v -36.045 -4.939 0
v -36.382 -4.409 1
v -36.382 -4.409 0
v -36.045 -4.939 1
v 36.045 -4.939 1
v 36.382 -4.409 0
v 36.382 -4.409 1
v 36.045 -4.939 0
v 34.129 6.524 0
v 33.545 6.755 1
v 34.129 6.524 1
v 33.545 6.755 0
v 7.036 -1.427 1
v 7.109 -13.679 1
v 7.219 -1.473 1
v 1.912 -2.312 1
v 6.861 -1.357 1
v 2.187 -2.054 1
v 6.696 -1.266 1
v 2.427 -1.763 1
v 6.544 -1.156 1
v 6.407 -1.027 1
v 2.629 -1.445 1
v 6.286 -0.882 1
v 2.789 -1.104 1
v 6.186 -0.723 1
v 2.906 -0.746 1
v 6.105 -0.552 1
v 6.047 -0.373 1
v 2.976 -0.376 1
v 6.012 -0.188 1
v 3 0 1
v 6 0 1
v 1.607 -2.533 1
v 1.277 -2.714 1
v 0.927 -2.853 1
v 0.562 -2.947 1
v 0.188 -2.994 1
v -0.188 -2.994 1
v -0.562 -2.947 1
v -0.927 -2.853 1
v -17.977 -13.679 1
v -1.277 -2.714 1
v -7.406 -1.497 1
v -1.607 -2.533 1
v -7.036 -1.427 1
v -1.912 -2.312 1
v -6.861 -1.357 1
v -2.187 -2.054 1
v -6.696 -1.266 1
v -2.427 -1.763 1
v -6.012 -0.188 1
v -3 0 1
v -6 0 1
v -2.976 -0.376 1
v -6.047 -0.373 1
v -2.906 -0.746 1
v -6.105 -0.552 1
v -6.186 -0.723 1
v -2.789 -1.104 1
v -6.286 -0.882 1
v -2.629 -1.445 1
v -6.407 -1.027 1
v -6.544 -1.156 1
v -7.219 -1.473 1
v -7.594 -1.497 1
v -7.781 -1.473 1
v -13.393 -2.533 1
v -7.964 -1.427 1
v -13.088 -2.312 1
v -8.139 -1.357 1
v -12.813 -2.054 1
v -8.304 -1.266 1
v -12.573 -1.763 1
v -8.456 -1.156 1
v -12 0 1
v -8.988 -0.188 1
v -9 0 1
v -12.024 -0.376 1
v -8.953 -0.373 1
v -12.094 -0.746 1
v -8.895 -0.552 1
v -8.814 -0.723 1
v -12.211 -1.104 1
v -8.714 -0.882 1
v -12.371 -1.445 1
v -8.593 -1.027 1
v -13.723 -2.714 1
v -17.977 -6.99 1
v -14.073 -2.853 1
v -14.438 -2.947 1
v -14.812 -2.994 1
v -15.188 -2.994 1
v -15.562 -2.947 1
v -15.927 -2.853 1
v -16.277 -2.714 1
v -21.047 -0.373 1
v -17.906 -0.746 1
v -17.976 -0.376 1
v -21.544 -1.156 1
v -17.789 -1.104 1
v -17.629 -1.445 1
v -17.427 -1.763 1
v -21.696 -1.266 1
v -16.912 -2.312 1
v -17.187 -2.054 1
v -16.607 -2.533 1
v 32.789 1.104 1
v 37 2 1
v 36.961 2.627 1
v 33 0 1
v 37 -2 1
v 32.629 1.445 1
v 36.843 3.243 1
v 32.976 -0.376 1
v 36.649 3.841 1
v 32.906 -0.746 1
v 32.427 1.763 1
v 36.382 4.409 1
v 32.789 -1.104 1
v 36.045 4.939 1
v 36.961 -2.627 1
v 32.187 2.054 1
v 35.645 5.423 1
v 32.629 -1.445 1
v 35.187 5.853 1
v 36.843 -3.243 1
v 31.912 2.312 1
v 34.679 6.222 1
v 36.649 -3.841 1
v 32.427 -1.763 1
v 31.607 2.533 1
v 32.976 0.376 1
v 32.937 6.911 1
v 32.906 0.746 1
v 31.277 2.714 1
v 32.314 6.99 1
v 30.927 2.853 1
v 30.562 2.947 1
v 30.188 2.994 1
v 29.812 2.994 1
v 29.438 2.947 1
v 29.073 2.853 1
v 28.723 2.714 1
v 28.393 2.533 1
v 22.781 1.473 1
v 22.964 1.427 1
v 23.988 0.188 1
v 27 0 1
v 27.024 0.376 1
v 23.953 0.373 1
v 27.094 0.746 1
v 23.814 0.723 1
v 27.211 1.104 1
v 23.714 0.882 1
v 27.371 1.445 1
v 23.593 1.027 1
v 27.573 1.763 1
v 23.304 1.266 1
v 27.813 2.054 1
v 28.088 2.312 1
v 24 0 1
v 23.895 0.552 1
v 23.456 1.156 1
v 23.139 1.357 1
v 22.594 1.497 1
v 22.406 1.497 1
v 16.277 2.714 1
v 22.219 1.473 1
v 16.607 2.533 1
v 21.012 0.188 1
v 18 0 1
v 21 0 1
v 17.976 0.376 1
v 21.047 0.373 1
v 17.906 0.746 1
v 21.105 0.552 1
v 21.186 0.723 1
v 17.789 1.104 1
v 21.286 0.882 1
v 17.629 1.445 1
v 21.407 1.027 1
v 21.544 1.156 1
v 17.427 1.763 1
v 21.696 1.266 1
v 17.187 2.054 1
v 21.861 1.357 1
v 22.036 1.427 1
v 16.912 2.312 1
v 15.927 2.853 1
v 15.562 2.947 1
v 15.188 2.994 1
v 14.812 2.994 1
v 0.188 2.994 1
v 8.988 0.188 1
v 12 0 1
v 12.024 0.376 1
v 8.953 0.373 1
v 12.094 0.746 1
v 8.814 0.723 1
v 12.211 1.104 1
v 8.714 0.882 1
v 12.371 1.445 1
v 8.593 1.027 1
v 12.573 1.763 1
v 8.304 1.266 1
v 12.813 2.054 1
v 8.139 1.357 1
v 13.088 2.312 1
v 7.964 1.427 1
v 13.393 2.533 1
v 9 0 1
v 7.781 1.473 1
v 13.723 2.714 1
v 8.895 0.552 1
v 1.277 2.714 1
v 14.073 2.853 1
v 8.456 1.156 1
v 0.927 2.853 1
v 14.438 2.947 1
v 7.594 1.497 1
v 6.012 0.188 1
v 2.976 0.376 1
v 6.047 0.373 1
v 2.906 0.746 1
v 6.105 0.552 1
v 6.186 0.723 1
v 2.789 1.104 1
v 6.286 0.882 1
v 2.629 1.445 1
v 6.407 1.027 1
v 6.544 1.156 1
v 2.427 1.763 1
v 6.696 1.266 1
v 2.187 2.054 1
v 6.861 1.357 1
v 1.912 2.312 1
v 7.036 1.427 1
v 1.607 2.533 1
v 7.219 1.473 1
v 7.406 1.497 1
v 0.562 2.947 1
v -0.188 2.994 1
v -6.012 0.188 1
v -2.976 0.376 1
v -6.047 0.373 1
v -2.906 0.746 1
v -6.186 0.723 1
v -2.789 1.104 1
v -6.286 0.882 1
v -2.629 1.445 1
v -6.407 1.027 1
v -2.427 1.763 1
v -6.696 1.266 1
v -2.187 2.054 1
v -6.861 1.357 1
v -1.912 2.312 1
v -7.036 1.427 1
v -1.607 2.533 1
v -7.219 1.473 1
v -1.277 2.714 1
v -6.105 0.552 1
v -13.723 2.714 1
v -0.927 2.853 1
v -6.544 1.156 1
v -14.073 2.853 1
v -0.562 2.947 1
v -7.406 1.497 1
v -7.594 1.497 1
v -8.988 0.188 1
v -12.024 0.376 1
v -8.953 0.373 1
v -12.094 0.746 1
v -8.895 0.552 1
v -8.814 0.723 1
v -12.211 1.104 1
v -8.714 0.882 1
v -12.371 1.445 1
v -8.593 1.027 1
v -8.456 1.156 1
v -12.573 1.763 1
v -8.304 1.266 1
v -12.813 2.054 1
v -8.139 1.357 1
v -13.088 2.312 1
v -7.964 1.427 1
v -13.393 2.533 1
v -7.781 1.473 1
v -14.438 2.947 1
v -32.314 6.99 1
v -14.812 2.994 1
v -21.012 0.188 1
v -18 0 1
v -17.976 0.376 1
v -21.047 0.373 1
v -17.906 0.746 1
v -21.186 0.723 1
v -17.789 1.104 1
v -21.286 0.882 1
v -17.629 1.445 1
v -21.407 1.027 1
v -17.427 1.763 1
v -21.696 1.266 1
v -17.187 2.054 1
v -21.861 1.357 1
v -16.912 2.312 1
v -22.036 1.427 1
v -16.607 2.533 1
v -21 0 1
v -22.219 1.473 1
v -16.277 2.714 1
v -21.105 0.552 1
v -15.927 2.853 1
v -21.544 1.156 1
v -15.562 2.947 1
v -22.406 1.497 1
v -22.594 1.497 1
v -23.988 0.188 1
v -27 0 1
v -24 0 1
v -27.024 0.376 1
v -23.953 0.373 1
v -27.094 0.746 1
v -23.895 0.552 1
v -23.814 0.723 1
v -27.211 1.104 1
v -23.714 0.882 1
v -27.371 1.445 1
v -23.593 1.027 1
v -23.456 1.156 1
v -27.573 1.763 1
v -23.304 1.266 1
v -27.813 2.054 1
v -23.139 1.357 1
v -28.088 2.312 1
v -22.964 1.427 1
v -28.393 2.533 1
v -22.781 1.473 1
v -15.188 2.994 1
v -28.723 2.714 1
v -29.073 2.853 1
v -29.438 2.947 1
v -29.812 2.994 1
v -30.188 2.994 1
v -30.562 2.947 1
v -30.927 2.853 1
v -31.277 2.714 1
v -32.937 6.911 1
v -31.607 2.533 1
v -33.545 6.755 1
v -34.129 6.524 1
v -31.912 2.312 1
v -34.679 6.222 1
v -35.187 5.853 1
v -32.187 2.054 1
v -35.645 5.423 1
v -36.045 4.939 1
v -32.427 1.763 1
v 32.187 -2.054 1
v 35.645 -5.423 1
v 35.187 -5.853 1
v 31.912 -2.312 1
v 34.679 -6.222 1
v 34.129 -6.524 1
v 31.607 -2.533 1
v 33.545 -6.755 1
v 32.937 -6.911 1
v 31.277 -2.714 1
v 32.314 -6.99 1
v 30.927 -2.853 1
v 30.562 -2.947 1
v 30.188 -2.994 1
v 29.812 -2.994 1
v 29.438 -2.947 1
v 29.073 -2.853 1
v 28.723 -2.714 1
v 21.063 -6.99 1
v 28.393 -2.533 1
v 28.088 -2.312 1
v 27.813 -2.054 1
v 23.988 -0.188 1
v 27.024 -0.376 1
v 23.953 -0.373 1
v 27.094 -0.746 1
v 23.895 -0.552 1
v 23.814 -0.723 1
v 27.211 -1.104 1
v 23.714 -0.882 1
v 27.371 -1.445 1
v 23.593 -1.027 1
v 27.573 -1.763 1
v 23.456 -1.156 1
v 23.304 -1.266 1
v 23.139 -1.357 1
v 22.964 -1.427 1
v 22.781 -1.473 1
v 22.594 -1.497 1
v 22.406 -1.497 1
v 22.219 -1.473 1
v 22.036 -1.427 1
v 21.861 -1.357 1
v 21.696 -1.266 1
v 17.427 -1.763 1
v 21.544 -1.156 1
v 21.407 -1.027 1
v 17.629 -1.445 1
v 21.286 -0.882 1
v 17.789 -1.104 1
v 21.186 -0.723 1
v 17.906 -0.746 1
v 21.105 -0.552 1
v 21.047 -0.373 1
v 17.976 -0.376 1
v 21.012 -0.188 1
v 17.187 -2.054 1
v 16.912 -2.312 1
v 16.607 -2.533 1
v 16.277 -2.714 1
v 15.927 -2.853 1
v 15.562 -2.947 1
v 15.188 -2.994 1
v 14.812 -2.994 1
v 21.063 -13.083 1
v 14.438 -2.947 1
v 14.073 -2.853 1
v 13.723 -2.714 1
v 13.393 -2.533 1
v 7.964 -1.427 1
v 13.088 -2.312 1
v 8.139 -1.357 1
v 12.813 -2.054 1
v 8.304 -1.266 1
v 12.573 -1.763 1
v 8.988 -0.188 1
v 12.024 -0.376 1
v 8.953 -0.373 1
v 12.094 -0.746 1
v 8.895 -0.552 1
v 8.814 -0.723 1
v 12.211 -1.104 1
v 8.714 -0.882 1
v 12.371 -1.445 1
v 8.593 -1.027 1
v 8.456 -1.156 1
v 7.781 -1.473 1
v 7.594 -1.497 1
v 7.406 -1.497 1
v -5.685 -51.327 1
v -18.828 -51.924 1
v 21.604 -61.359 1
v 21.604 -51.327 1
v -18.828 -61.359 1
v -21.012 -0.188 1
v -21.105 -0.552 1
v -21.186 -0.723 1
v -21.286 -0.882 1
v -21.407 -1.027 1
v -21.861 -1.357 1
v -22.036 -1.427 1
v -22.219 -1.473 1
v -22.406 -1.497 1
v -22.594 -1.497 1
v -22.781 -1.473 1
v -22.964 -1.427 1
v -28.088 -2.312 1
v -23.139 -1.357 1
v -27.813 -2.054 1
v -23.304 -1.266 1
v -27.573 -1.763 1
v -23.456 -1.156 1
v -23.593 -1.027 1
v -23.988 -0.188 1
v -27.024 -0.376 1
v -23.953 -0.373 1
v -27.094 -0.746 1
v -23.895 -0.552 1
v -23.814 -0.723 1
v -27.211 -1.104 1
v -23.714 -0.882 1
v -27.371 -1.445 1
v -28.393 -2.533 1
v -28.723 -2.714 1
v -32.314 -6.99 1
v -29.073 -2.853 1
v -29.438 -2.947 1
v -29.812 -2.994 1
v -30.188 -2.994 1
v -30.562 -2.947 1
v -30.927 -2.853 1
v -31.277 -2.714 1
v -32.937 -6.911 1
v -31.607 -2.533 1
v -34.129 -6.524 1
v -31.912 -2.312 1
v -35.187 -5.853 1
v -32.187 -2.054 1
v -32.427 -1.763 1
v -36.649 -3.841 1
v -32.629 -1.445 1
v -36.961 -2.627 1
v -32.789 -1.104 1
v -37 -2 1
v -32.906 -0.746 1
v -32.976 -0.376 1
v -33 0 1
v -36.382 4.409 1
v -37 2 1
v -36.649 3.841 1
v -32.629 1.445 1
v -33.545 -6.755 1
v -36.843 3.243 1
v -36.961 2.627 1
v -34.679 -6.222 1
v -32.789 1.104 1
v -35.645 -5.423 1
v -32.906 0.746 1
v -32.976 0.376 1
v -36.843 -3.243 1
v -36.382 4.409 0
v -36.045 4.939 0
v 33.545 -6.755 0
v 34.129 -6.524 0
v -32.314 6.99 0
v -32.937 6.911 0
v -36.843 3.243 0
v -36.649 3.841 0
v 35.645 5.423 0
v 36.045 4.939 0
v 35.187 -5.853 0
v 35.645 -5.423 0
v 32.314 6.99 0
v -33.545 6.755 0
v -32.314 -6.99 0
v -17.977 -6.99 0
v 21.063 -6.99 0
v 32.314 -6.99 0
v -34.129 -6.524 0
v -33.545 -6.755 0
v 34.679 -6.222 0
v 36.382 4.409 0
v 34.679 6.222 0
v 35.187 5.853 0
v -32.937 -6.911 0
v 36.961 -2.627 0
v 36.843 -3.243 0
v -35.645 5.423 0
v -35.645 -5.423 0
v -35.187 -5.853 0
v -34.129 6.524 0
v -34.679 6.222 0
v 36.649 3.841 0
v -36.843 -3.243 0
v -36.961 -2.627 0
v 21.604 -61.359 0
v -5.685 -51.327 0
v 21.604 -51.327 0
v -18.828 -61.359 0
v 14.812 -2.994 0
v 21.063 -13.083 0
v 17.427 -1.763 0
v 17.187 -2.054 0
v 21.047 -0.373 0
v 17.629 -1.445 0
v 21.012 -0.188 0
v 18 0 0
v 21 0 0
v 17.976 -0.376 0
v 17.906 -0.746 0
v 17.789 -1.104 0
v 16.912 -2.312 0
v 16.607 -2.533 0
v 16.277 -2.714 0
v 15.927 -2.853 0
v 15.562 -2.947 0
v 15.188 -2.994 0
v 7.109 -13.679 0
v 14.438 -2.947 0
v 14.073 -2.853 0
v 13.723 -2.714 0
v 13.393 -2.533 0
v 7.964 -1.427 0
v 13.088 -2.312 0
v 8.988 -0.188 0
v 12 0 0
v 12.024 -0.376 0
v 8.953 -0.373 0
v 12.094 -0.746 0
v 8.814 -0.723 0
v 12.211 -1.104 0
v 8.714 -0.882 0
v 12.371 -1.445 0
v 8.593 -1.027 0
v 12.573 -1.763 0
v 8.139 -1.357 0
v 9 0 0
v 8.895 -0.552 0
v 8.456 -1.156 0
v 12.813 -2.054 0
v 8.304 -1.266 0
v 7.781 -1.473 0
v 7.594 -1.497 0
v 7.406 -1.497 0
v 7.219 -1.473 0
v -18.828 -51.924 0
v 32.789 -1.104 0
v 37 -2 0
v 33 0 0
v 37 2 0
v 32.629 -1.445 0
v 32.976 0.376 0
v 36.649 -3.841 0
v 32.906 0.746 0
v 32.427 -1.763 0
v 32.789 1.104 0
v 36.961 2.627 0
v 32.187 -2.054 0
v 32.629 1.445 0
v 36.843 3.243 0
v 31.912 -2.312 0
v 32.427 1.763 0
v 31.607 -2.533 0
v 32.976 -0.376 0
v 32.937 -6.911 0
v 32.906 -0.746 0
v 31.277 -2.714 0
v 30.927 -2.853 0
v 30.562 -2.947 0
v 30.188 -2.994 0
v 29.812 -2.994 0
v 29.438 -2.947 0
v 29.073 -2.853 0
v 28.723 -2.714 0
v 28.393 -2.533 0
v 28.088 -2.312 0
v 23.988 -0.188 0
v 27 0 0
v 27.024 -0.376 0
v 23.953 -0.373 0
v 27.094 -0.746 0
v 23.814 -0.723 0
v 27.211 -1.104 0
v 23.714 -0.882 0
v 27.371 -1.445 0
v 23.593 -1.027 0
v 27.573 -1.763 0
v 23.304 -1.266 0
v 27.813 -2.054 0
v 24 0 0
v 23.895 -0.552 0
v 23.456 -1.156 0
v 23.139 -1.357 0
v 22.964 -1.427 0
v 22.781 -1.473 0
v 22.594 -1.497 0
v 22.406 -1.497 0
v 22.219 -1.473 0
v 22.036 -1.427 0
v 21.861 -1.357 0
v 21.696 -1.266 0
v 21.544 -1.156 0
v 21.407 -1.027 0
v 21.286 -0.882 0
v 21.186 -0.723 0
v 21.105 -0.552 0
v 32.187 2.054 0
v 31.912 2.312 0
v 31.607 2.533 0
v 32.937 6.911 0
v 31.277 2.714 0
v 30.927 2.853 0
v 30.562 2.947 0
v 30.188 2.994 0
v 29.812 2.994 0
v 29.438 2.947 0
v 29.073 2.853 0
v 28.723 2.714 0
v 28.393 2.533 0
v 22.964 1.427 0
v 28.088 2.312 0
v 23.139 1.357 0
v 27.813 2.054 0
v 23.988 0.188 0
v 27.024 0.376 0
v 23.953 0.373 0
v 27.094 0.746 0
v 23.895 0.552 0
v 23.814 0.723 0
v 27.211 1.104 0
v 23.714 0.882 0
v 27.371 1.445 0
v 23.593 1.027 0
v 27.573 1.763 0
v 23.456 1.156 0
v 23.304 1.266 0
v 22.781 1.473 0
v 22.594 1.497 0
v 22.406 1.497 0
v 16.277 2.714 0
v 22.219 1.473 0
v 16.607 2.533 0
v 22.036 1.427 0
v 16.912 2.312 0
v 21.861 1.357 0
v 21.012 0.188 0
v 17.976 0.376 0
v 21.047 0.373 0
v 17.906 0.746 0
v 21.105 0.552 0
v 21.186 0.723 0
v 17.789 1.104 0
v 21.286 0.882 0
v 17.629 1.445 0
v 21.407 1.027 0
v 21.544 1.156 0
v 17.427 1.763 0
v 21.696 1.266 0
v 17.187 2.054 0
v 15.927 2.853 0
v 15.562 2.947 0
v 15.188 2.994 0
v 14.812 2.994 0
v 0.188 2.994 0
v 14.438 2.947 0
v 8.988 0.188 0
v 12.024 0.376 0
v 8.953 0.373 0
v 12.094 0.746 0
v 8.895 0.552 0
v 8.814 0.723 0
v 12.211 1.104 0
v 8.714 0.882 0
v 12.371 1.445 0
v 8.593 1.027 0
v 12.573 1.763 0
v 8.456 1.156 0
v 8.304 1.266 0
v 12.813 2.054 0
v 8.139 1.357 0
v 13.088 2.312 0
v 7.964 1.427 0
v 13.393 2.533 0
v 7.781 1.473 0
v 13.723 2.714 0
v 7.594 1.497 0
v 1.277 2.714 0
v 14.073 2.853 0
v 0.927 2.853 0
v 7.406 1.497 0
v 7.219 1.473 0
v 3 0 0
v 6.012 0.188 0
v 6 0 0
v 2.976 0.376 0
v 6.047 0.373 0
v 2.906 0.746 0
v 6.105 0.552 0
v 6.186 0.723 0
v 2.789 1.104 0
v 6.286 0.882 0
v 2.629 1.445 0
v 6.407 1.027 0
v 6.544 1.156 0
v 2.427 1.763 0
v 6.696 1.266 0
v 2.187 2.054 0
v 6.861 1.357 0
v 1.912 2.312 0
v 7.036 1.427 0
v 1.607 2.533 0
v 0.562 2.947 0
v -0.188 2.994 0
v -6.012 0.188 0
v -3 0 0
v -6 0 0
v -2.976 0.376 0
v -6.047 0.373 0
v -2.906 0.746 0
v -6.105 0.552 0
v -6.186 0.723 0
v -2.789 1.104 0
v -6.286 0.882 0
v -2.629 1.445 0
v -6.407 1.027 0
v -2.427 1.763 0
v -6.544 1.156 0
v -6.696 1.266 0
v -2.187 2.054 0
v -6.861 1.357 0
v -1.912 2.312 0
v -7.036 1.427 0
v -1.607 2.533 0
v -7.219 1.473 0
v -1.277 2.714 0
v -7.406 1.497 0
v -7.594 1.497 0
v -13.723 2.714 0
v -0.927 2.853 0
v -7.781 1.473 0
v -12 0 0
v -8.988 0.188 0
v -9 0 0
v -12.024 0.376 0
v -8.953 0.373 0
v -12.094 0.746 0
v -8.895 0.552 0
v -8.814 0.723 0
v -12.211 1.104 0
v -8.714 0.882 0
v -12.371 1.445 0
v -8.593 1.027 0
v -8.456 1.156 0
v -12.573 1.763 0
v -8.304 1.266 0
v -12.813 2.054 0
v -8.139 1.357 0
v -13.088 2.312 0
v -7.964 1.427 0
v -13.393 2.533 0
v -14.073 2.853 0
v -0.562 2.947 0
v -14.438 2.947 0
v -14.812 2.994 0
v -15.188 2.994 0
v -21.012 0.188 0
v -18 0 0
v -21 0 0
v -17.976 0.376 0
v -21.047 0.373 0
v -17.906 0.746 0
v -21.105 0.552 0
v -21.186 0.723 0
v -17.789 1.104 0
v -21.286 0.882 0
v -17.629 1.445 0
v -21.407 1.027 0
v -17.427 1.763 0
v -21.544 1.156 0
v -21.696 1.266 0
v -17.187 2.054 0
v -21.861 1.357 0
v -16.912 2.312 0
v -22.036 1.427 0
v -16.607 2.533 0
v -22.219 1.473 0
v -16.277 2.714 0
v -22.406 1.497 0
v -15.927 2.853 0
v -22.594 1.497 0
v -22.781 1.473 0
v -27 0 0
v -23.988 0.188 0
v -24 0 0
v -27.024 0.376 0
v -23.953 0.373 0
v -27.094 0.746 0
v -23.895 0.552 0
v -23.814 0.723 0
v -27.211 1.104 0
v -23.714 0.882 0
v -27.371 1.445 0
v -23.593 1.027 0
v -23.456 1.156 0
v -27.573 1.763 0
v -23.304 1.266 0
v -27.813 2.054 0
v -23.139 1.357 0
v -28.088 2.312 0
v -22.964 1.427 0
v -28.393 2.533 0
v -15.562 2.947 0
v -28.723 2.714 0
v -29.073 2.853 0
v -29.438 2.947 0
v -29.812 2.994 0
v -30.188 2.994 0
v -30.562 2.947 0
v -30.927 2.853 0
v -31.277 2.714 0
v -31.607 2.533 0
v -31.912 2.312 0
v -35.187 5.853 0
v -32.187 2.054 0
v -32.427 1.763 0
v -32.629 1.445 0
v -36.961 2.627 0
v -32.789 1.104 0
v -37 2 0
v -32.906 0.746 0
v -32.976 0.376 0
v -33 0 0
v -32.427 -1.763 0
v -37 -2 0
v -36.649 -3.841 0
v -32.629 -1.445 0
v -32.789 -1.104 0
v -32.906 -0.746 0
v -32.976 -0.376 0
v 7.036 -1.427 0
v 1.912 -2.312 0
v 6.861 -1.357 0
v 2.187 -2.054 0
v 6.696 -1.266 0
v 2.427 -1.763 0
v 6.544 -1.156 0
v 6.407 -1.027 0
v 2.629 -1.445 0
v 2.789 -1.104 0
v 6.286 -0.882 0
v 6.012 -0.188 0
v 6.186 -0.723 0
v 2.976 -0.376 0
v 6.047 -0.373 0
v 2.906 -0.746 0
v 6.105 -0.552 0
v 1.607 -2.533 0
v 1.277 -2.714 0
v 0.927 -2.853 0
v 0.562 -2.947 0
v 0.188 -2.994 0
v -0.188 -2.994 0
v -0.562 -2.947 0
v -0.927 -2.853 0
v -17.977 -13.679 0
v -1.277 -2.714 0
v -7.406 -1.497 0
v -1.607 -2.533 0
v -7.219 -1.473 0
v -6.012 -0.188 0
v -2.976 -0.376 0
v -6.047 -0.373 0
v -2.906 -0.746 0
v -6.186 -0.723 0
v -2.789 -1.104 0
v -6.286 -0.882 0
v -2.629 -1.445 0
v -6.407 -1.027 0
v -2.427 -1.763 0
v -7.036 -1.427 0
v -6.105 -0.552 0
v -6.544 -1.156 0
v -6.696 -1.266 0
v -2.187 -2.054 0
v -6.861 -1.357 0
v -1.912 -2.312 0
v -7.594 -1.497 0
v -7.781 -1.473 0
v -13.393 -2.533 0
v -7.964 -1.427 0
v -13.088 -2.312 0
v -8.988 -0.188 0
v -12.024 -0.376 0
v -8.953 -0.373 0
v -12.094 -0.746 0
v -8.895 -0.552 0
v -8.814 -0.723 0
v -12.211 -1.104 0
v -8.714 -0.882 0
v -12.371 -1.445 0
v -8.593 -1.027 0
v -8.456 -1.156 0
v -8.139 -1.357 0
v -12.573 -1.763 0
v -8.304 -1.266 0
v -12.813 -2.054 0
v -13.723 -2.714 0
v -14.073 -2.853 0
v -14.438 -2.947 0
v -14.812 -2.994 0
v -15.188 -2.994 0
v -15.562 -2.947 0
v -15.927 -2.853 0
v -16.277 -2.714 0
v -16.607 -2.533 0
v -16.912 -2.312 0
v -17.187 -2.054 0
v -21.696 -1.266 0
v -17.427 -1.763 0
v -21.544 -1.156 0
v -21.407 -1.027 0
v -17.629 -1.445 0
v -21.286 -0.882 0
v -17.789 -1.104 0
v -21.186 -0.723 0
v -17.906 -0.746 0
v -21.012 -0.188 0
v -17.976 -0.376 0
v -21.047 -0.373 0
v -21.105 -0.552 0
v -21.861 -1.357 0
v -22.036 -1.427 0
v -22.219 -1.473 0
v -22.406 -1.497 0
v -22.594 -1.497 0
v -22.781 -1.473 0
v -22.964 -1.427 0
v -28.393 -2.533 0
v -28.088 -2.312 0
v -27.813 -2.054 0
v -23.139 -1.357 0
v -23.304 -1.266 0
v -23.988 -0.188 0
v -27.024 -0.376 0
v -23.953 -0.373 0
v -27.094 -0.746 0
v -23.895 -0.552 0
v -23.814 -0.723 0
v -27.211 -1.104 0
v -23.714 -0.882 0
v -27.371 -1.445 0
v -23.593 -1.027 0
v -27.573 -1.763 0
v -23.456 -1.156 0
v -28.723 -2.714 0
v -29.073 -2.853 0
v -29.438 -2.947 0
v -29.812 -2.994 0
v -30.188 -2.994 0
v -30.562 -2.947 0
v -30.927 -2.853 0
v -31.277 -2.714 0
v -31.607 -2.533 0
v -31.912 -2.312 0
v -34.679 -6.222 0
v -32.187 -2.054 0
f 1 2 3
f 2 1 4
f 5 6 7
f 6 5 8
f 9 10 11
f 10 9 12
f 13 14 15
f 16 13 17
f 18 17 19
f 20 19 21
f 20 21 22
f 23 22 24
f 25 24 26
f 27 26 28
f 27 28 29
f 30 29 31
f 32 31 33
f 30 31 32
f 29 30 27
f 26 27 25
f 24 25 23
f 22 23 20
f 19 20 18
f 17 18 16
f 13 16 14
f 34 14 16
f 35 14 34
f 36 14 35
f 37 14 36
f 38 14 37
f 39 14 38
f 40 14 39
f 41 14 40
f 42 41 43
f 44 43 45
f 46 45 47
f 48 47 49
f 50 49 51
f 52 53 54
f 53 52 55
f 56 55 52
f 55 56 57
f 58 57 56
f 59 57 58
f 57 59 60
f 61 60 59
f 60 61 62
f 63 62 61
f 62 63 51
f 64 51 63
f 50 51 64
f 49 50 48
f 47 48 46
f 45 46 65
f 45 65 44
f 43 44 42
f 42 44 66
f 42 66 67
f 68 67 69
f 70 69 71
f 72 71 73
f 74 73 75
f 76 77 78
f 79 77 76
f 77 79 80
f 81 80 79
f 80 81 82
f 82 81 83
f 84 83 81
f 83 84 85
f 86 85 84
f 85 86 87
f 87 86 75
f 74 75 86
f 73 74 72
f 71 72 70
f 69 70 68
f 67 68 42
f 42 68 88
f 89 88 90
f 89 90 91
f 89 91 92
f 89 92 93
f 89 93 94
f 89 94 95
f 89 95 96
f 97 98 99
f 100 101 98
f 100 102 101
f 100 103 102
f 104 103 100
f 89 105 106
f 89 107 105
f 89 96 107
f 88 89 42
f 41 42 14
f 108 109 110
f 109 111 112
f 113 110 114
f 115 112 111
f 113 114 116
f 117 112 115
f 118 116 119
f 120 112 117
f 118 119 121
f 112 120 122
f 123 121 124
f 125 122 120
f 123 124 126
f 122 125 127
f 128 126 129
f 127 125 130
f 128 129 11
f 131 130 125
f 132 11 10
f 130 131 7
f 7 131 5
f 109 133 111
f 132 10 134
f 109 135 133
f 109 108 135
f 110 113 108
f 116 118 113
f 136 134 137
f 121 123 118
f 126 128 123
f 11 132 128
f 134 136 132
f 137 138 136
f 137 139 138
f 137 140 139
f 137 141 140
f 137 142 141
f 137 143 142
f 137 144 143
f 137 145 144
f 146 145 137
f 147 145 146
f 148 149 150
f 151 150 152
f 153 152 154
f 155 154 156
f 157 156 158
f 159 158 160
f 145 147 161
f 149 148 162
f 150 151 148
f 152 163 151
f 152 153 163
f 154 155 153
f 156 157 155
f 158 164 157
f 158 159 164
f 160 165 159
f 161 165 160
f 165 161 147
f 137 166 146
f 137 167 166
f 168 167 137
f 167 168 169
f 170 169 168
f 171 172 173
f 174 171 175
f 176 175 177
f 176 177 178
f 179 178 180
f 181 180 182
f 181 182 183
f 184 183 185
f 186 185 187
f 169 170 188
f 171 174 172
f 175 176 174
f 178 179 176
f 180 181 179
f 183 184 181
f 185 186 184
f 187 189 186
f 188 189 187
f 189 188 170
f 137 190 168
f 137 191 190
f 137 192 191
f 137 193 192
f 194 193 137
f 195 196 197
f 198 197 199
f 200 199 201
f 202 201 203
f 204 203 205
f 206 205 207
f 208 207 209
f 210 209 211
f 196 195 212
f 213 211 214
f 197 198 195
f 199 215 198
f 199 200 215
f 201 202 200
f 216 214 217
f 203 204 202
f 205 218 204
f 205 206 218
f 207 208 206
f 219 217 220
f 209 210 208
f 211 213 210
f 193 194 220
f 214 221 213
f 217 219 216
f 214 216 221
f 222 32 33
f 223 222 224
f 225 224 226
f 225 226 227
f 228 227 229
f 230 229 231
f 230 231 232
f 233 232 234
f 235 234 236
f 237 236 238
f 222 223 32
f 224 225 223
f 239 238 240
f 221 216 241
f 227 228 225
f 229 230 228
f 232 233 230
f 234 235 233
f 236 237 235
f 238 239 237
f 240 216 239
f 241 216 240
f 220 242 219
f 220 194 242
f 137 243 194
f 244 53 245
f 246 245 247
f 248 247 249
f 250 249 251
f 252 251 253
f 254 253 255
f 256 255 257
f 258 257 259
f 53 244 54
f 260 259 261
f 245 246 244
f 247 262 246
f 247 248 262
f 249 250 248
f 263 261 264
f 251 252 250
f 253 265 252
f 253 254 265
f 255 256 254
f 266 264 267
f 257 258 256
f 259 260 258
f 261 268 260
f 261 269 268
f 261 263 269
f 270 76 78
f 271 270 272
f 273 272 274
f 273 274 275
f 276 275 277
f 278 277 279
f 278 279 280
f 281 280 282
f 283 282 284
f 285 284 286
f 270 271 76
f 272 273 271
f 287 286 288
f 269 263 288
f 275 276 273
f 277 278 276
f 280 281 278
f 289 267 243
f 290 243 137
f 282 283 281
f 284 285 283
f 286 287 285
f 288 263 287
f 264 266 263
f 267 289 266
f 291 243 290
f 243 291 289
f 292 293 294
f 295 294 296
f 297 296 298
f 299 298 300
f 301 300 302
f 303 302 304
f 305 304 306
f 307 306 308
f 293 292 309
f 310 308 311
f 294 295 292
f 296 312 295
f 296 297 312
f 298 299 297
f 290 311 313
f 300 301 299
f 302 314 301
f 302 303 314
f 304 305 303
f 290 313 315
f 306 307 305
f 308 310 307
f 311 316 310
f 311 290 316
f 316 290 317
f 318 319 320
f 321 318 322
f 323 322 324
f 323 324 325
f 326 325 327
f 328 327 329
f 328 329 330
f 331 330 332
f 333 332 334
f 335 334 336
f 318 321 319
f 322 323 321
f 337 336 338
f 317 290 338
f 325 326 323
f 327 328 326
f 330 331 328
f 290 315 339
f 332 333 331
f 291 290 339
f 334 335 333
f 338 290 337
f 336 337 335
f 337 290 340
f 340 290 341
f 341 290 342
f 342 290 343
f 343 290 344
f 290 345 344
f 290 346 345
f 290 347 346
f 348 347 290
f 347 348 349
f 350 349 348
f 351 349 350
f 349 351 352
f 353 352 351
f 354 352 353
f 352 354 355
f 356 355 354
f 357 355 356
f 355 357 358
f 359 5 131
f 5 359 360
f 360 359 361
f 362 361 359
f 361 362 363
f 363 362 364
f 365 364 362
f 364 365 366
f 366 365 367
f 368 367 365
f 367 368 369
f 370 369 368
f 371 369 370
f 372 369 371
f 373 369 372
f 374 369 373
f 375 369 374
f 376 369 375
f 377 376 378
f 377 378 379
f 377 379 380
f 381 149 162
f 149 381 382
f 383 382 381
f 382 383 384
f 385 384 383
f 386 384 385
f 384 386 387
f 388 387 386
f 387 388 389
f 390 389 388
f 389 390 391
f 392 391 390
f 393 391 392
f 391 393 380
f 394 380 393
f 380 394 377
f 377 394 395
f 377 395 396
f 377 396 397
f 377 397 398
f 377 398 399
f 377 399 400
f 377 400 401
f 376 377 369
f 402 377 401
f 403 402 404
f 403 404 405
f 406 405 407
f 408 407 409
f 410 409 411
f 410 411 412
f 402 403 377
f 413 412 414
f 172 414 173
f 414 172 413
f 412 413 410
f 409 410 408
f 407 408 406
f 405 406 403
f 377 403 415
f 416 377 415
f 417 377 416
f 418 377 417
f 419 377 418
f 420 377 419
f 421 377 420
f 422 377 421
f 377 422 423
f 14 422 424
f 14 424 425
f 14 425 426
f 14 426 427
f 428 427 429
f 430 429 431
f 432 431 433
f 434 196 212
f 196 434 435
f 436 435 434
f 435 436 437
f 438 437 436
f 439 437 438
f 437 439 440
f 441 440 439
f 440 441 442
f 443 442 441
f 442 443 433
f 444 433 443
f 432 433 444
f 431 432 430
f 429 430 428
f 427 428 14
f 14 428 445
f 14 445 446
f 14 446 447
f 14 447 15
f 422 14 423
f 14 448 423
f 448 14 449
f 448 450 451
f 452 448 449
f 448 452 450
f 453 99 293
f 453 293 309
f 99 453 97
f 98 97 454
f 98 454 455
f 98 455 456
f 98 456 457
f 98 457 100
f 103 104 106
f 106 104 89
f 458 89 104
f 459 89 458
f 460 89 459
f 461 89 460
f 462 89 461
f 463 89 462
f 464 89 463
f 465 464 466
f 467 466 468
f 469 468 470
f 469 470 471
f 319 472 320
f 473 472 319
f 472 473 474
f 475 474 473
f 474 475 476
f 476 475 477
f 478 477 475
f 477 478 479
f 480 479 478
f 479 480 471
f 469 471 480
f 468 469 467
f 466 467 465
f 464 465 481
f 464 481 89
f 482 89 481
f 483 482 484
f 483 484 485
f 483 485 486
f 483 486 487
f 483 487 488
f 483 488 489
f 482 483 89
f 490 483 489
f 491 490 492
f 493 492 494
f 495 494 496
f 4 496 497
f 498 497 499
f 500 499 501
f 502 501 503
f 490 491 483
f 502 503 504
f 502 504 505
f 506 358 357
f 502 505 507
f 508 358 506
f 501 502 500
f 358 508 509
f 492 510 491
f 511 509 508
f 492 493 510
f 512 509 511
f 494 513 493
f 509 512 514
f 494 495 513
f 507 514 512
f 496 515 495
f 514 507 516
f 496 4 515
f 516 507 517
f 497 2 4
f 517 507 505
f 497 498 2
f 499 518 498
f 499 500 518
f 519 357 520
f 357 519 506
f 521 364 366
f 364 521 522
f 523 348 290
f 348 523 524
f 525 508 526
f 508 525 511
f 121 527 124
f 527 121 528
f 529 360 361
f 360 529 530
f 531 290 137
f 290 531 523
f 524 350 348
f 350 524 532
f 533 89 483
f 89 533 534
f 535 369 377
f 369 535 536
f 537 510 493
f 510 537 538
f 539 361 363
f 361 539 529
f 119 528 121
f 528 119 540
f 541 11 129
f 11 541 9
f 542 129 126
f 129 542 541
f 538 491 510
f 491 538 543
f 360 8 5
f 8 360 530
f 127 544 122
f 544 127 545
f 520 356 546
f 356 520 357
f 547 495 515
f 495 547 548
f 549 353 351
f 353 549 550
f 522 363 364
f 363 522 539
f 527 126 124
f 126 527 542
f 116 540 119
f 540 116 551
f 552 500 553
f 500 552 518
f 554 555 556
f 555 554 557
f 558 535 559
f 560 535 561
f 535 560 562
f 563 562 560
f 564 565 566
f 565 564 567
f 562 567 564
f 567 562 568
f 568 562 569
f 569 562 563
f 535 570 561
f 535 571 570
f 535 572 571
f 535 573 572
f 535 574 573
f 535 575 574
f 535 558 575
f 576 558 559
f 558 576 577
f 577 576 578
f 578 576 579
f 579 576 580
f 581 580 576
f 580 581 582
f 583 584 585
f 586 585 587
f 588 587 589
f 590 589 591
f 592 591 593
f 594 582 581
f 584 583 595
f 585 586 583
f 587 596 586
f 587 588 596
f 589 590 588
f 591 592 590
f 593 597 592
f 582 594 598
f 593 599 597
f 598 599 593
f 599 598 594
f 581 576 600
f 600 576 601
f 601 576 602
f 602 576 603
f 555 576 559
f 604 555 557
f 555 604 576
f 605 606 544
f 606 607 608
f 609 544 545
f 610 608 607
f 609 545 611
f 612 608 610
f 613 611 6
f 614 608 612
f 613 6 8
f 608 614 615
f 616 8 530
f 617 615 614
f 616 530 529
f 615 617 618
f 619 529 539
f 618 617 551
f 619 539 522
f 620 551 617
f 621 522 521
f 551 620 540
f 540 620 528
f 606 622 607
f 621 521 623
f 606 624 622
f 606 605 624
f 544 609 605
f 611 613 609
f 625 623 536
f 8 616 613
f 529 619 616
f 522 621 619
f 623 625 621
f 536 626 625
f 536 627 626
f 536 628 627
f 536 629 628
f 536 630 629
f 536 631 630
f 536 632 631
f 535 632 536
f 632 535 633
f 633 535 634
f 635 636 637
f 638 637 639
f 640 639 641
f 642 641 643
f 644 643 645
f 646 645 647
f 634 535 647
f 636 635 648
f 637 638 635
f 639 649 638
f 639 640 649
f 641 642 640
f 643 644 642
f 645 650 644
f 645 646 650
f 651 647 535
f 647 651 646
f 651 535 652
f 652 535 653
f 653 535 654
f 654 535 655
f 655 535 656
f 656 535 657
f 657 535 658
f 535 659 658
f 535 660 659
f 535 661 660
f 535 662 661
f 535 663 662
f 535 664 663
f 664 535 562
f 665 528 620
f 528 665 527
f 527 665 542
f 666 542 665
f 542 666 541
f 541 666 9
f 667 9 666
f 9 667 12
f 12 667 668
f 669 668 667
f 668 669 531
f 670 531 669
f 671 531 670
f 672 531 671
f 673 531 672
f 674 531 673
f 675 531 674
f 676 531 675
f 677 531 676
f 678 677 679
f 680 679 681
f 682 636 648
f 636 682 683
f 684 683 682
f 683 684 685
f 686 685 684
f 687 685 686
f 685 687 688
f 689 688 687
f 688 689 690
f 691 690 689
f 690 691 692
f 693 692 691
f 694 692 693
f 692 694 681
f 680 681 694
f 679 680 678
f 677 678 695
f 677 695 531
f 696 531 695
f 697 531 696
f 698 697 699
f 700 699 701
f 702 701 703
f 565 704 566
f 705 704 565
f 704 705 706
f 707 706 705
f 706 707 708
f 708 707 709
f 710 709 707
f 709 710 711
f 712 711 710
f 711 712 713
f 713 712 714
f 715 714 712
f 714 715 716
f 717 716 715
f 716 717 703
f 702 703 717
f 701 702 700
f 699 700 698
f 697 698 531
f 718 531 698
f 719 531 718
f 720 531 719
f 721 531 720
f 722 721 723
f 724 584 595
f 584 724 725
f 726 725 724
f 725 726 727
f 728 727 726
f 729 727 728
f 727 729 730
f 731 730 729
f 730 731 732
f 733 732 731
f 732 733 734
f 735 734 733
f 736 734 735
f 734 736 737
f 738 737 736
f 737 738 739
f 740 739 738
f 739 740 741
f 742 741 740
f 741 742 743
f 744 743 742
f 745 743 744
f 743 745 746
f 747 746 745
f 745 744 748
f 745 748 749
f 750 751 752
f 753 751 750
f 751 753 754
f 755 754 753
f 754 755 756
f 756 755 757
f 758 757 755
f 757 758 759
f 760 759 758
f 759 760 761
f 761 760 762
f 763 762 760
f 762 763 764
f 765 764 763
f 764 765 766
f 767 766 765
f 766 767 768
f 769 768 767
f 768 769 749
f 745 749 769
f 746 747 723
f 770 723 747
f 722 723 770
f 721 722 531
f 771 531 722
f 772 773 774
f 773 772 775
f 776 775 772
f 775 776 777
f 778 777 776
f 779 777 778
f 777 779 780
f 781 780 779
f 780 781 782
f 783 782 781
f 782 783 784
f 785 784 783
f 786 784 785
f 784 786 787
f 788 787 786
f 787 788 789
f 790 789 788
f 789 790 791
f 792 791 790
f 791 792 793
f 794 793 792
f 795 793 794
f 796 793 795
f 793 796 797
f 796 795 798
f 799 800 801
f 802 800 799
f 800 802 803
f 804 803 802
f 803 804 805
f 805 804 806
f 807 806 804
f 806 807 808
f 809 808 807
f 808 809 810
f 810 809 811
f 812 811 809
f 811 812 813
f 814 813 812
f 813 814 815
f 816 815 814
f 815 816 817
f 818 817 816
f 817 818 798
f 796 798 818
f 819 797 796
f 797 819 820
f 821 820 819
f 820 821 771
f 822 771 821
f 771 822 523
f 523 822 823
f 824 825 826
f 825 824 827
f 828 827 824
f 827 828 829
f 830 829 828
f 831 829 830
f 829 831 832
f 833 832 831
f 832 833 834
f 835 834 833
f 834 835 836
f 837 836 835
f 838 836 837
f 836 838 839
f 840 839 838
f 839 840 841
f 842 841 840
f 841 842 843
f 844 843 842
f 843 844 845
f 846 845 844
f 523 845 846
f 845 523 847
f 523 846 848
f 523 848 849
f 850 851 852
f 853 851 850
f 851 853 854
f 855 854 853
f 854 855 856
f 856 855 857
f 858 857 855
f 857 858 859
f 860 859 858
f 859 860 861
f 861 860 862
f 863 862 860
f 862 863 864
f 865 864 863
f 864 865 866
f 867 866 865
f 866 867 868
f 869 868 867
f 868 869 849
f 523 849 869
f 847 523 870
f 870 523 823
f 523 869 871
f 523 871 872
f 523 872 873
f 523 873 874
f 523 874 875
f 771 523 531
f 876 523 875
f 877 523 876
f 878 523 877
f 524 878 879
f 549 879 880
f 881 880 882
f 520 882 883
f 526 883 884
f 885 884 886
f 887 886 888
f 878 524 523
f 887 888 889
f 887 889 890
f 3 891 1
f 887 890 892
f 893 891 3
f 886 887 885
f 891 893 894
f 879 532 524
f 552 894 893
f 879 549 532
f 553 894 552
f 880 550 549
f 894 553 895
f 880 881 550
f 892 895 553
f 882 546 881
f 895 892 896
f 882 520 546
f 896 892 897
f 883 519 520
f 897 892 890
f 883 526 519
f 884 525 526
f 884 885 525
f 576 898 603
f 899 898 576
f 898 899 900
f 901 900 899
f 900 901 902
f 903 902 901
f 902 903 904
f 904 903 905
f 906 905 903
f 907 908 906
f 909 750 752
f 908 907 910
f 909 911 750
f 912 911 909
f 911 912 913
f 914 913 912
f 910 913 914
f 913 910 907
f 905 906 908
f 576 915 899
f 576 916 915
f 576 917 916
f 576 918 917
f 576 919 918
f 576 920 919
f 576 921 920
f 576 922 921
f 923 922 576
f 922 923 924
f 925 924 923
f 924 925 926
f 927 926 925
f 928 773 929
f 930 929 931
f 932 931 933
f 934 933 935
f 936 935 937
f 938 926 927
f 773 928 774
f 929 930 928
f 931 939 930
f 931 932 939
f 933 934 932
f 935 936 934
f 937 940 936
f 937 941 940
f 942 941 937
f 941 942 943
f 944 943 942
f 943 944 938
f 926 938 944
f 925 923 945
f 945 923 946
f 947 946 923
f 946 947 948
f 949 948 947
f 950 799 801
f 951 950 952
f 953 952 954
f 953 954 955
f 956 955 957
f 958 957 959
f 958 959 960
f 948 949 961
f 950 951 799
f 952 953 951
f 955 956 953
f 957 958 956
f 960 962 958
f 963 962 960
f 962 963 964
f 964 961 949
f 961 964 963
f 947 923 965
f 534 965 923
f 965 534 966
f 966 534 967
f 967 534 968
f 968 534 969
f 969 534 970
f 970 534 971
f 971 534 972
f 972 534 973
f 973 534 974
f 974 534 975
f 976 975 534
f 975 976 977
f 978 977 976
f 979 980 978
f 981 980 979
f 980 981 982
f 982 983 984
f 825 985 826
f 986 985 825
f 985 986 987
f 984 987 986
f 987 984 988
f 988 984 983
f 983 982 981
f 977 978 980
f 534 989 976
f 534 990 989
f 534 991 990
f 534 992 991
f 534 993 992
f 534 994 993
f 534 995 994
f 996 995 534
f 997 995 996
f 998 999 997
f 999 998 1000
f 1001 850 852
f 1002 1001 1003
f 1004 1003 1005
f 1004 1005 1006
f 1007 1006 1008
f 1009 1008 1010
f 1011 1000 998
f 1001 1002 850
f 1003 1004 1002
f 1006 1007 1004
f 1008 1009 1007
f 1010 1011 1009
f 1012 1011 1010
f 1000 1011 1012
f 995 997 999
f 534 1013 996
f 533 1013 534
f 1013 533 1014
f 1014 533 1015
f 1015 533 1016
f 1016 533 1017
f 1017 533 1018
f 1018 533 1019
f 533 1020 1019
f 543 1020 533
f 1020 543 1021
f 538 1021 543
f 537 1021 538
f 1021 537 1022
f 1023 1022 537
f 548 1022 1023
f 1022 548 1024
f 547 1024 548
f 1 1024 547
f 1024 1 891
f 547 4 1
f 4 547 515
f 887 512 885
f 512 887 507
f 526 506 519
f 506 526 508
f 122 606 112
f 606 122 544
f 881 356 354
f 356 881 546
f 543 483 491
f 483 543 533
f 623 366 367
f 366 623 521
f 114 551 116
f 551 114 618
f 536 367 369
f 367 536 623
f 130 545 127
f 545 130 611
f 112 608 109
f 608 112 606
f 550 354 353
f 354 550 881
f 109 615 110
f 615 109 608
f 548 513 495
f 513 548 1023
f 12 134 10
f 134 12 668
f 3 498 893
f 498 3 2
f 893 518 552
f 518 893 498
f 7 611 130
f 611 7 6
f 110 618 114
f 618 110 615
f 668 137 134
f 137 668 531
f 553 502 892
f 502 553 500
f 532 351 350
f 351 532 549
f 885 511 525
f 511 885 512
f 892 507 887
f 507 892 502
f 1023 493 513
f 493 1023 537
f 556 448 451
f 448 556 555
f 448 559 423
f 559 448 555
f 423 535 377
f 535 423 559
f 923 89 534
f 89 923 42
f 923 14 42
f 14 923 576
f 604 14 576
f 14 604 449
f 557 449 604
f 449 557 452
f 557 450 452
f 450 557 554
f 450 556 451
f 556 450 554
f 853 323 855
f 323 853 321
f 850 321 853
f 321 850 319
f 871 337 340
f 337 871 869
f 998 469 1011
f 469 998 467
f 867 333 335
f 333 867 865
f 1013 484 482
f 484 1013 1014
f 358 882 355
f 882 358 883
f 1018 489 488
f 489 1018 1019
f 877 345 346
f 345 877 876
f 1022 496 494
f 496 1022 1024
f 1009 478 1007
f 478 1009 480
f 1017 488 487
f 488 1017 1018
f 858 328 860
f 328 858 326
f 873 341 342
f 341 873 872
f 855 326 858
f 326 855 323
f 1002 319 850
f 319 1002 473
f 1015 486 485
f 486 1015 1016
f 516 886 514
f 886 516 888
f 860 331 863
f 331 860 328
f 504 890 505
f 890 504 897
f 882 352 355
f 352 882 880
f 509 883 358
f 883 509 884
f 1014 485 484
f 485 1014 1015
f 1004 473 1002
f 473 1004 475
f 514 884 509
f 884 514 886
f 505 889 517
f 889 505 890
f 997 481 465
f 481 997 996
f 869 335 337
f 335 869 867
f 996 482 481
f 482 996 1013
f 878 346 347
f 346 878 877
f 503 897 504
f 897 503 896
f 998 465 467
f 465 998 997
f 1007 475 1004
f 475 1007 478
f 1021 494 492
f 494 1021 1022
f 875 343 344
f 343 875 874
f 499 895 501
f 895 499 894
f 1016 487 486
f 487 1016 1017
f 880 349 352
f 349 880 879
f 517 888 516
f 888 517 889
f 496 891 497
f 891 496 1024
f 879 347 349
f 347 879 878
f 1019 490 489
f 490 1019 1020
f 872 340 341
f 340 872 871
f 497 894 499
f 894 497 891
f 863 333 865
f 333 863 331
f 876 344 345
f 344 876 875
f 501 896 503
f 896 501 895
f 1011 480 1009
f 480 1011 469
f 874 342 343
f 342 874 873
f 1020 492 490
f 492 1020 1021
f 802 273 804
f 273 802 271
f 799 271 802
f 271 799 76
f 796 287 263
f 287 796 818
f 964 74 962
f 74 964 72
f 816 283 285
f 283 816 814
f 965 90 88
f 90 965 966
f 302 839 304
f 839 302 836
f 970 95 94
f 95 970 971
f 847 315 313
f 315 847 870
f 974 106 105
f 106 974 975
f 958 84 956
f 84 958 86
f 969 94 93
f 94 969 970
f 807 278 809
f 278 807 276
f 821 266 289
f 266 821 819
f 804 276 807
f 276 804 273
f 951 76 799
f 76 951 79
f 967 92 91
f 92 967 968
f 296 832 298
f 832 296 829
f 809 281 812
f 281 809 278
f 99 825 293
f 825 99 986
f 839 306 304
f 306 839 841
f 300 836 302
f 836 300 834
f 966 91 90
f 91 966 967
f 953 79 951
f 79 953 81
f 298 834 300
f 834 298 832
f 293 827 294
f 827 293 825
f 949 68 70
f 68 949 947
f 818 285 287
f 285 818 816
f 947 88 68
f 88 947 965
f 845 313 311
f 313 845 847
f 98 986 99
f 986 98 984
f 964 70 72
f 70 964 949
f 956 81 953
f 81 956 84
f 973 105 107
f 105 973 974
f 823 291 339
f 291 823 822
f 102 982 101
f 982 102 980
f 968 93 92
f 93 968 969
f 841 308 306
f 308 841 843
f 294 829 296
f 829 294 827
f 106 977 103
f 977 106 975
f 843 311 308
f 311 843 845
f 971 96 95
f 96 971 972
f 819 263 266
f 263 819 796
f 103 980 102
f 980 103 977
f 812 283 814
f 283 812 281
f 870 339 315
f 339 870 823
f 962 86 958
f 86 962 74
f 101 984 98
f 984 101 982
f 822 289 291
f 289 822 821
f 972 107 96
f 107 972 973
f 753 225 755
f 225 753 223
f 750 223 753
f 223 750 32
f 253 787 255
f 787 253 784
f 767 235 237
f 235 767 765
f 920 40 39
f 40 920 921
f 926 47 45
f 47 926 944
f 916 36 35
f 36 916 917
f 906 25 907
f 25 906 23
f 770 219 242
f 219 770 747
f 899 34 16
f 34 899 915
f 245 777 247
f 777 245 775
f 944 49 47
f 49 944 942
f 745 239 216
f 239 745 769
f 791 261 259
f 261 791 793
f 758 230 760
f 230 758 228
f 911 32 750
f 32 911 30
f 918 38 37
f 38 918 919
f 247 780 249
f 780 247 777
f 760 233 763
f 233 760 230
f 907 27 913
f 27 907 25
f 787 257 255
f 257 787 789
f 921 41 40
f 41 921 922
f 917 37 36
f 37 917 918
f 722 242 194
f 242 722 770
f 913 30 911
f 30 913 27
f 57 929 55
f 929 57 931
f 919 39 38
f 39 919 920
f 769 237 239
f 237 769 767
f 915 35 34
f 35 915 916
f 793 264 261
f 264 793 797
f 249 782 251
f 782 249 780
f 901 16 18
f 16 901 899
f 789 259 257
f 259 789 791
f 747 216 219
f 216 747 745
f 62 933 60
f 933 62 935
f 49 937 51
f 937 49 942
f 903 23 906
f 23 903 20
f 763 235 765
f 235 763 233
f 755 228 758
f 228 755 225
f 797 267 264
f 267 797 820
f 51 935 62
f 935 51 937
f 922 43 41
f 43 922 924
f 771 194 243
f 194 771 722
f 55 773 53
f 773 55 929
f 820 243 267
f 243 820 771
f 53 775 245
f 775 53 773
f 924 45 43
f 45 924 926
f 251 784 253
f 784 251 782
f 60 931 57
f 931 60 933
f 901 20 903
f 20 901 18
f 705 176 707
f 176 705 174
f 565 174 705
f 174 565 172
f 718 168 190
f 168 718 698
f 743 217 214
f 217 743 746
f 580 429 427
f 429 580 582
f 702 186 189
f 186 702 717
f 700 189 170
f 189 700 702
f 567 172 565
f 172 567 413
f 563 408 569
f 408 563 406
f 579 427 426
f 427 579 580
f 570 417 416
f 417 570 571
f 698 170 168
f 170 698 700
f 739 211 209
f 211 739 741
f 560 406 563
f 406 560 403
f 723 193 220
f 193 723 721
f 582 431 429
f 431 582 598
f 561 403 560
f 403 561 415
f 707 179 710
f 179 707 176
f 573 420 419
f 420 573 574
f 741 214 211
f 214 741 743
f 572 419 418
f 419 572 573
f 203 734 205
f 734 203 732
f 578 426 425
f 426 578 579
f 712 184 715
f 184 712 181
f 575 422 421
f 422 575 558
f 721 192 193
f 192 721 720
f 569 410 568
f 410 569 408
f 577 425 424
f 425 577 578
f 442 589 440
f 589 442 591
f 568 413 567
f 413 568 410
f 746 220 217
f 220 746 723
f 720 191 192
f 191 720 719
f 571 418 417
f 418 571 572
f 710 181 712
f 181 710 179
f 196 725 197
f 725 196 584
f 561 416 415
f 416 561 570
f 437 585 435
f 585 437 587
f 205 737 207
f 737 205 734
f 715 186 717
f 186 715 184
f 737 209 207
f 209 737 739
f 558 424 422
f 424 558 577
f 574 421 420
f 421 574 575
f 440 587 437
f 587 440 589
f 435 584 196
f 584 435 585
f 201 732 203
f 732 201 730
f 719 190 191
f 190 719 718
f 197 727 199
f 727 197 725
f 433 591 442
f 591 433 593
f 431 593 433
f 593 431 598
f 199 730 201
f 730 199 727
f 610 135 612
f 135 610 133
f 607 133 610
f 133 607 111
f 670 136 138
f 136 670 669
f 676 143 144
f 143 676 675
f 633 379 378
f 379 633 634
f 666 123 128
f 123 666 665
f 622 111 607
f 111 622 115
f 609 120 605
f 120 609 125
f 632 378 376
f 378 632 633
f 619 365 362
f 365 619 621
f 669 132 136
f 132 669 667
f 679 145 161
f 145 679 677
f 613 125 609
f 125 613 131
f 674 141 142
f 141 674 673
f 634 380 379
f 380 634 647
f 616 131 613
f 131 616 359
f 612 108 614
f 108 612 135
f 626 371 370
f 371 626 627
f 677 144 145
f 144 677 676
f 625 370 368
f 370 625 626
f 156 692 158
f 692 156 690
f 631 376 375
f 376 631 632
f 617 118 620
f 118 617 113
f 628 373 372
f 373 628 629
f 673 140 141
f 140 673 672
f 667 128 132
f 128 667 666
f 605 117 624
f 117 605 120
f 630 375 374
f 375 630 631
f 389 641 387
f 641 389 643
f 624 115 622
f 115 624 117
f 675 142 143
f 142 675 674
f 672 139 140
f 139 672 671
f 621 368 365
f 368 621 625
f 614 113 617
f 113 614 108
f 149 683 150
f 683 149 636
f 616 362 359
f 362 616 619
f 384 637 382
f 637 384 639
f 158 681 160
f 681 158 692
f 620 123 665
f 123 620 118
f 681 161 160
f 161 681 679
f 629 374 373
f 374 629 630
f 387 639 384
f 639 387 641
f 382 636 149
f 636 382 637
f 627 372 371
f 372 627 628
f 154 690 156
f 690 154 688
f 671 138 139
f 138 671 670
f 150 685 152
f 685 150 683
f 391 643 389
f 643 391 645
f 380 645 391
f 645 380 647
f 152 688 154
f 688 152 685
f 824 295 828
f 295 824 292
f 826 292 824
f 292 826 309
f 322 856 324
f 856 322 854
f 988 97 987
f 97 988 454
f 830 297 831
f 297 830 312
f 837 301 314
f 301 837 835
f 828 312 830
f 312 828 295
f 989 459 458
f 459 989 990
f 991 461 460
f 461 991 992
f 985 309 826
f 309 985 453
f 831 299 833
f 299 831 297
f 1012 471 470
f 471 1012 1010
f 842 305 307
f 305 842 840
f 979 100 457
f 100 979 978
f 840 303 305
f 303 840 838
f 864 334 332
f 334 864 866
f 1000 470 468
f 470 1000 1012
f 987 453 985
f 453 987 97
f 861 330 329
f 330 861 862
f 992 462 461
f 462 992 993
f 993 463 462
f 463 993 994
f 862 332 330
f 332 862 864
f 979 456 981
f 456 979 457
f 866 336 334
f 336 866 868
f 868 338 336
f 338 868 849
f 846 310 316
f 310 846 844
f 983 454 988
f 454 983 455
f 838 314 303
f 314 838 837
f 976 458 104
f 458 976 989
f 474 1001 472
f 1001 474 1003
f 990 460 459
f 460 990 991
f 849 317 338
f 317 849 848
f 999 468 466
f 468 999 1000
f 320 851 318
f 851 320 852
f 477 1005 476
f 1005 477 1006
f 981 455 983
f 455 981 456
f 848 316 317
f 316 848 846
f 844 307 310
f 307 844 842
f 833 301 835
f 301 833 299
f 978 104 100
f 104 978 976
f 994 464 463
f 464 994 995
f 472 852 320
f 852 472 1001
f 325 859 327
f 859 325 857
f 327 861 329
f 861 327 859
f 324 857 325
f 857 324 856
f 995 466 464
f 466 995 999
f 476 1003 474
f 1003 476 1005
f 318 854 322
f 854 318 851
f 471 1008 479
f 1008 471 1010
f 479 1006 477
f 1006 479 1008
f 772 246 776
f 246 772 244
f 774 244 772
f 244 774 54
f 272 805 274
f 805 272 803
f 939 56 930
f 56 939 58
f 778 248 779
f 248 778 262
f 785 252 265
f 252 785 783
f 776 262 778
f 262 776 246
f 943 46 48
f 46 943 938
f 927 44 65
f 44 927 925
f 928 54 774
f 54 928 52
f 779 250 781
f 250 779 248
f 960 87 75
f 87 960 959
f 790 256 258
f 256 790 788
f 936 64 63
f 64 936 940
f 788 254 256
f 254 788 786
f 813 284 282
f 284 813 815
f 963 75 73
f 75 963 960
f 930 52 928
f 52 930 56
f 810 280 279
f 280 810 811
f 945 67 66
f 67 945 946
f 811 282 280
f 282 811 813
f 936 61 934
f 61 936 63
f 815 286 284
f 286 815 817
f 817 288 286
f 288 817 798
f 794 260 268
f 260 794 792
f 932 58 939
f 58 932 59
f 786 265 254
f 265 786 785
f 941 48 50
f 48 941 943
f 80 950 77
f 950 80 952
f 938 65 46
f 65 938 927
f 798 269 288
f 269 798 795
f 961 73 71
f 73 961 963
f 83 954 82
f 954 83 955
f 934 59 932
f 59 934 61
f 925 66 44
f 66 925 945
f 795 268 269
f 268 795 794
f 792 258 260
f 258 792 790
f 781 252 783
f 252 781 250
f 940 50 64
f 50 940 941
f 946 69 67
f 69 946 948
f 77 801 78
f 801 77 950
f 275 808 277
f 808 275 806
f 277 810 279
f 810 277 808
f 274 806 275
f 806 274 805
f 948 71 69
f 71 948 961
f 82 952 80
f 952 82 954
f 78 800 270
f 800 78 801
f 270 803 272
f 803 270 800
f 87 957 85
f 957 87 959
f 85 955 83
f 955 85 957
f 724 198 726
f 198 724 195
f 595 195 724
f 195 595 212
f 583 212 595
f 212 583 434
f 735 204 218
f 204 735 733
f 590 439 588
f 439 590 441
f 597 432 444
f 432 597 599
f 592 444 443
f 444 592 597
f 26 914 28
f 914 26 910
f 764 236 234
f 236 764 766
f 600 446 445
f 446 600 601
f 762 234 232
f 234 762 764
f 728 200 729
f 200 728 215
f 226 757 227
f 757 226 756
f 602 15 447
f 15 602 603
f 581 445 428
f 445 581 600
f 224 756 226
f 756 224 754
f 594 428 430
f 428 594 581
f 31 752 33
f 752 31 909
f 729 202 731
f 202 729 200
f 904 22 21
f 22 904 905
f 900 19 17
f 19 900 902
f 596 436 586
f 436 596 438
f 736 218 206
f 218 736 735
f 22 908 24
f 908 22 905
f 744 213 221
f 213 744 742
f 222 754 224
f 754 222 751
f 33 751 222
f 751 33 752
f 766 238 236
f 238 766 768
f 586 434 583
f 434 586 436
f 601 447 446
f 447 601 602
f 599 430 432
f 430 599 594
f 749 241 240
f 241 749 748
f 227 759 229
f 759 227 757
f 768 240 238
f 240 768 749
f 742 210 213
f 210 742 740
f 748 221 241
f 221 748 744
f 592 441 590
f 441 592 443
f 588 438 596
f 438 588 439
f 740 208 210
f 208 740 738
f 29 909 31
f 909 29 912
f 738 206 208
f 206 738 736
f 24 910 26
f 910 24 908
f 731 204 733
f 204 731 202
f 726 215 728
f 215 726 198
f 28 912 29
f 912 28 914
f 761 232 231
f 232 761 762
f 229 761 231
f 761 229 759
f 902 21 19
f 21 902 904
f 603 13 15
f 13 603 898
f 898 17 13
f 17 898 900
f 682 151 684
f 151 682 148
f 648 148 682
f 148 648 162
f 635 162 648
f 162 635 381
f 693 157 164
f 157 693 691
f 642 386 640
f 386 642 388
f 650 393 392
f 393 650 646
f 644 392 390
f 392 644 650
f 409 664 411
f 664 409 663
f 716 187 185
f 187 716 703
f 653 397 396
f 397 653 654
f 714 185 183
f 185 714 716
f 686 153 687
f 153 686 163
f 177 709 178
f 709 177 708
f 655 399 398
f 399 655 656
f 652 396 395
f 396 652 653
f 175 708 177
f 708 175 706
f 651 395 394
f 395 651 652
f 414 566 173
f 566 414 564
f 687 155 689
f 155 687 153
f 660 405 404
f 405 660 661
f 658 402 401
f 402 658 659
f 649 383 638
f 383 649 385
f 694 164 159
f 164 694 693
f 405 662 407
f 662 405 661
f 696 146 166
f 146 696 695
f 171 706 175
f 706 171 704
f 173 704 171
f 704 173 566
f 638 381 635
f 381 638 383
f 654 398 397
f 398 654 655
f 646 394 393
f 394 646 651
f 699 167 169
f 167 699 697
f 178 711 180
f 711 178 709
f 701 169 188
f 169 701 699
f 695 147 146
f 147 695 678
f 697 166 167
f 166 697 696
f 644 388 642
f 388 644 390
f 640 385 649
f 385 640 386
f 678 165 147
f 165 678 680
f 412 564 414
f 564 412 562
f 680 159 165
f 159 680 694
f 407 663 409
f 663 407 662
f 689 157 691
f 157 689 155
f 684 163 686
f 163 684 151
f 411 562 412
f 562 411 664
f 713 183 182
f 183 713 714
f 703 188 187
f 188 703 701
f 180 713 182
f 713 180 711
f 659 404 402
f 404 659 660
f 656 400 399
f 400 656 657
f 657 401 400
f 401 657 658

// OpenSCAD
$fn = 50;


difference() {
	union() {
		hull() {
			translate(v = [-32.0000000000, 2.0000000000, 0]) {
				cylinder(h = 1, r = 5);
			}
			translate(v = [32.0000000000, 2.0000000000, 0]) {
				cylinder(h = 1, r = 5);
			}
			translate(v = [-32.0000000000, -2.0000000000, 0]) {
				cylinder(h = 1, r = 5);
			}
			translate(v = [32.0000000000, -2.0000000000, 0]) {
				cylinder(h = 1, r = 5);
			}
		}
		translate(v = [0, -5, 0]) {
			linear_extrude(height = 1) {
				text(font = "DejaVu Sans Mono:style=Bold", halign = "center", size = 57.0000000000, text = "Z", valign = "top");
			}
		}
	}
	union() {
		translate(v = [-30.0000000000, 0.0000000000, 0]) {
			translate(v = [0, 0, -100]) {
				cylinder(h = 200, r = 3.0000000000);
			}
		}
		translate(v = [-15.0000000000, 0.0000000000, 0]) {
			translate(v = [0, 0, -100]) {
				cylinder(h = 200, r = 3.0000000000);
			}
		}
		translate(v = [0, 0, -100]) {
			cylinder(h = 200, r = 3.0000000000);
		}
		translate(v = [15.0000000000, 0.0000000000, 0]) {
			translate(v = [0, 0, -100]) {
				cylinder(h = 200, r = 3.0000000000);
			}
		}
		translate(v = [30.0000000000, 0.0000000000, 0]) {
			translate(v = [0, 0, -100]) {
				cylinder(h = 200, r = 3.0000000000);
			}
		}
		translate(v = [-30.0000000000, 0.0000000000, 0]) {
			translate(v = [0, 0, -100]) {
				cylinder(h = 200, r = 1.5000000000);
			}
		}
		translate(v = [-22.5000000000, 0.0000000000, 0]) {
			translate(v = [0, 0, -100]) {
				cylinder(h = 200, r = 1.5000000000);
			}
		}
		translate(v = [-15.0000000000, 0.0000000000, 0]) {
			translate(v = [0, 0, -100]) {
				cylinder(h = 200, r = 1.5000000000);
			}
		}
		translate(v = [-7.5000000000, 0.0000000000, 0]) {
			translate(v = [0, 0, -100]) {
				cylinder(h = 200, r = 1.5000000000);
			}
		}
		translate(v = [0, 0, -100]) {
			cylinder(h = 200, r = 1.5000000000);
		}
		translate(v = [7.5000000000, 0.0000000000, 0]) {
			translate(v = [0, 0, -100]) {
				cylinder(h = 200, r = 1.5000000000);
			}
		}
		translate(v = [15.0000000000, 0.0000000000, 0]) {
			translate(v = [0, 0, -100]) {
				cylinder(h = 200, r = 1.5000000000);
			}
		}
		translate(v = [22.5000000000, 0.0000000000, 0]) {
			translate(v = [0, 0, -100]) {
				cylinder(h = 200, r = 1.5000000000);
			}
		}
		translate(v = [30.0000000000, 0.0000000000, 0]) {
			translate(v = [0, 0, -100]) {
				cylinder(h = 200, r = 1.5000000000);
			}
		}
	}
}
